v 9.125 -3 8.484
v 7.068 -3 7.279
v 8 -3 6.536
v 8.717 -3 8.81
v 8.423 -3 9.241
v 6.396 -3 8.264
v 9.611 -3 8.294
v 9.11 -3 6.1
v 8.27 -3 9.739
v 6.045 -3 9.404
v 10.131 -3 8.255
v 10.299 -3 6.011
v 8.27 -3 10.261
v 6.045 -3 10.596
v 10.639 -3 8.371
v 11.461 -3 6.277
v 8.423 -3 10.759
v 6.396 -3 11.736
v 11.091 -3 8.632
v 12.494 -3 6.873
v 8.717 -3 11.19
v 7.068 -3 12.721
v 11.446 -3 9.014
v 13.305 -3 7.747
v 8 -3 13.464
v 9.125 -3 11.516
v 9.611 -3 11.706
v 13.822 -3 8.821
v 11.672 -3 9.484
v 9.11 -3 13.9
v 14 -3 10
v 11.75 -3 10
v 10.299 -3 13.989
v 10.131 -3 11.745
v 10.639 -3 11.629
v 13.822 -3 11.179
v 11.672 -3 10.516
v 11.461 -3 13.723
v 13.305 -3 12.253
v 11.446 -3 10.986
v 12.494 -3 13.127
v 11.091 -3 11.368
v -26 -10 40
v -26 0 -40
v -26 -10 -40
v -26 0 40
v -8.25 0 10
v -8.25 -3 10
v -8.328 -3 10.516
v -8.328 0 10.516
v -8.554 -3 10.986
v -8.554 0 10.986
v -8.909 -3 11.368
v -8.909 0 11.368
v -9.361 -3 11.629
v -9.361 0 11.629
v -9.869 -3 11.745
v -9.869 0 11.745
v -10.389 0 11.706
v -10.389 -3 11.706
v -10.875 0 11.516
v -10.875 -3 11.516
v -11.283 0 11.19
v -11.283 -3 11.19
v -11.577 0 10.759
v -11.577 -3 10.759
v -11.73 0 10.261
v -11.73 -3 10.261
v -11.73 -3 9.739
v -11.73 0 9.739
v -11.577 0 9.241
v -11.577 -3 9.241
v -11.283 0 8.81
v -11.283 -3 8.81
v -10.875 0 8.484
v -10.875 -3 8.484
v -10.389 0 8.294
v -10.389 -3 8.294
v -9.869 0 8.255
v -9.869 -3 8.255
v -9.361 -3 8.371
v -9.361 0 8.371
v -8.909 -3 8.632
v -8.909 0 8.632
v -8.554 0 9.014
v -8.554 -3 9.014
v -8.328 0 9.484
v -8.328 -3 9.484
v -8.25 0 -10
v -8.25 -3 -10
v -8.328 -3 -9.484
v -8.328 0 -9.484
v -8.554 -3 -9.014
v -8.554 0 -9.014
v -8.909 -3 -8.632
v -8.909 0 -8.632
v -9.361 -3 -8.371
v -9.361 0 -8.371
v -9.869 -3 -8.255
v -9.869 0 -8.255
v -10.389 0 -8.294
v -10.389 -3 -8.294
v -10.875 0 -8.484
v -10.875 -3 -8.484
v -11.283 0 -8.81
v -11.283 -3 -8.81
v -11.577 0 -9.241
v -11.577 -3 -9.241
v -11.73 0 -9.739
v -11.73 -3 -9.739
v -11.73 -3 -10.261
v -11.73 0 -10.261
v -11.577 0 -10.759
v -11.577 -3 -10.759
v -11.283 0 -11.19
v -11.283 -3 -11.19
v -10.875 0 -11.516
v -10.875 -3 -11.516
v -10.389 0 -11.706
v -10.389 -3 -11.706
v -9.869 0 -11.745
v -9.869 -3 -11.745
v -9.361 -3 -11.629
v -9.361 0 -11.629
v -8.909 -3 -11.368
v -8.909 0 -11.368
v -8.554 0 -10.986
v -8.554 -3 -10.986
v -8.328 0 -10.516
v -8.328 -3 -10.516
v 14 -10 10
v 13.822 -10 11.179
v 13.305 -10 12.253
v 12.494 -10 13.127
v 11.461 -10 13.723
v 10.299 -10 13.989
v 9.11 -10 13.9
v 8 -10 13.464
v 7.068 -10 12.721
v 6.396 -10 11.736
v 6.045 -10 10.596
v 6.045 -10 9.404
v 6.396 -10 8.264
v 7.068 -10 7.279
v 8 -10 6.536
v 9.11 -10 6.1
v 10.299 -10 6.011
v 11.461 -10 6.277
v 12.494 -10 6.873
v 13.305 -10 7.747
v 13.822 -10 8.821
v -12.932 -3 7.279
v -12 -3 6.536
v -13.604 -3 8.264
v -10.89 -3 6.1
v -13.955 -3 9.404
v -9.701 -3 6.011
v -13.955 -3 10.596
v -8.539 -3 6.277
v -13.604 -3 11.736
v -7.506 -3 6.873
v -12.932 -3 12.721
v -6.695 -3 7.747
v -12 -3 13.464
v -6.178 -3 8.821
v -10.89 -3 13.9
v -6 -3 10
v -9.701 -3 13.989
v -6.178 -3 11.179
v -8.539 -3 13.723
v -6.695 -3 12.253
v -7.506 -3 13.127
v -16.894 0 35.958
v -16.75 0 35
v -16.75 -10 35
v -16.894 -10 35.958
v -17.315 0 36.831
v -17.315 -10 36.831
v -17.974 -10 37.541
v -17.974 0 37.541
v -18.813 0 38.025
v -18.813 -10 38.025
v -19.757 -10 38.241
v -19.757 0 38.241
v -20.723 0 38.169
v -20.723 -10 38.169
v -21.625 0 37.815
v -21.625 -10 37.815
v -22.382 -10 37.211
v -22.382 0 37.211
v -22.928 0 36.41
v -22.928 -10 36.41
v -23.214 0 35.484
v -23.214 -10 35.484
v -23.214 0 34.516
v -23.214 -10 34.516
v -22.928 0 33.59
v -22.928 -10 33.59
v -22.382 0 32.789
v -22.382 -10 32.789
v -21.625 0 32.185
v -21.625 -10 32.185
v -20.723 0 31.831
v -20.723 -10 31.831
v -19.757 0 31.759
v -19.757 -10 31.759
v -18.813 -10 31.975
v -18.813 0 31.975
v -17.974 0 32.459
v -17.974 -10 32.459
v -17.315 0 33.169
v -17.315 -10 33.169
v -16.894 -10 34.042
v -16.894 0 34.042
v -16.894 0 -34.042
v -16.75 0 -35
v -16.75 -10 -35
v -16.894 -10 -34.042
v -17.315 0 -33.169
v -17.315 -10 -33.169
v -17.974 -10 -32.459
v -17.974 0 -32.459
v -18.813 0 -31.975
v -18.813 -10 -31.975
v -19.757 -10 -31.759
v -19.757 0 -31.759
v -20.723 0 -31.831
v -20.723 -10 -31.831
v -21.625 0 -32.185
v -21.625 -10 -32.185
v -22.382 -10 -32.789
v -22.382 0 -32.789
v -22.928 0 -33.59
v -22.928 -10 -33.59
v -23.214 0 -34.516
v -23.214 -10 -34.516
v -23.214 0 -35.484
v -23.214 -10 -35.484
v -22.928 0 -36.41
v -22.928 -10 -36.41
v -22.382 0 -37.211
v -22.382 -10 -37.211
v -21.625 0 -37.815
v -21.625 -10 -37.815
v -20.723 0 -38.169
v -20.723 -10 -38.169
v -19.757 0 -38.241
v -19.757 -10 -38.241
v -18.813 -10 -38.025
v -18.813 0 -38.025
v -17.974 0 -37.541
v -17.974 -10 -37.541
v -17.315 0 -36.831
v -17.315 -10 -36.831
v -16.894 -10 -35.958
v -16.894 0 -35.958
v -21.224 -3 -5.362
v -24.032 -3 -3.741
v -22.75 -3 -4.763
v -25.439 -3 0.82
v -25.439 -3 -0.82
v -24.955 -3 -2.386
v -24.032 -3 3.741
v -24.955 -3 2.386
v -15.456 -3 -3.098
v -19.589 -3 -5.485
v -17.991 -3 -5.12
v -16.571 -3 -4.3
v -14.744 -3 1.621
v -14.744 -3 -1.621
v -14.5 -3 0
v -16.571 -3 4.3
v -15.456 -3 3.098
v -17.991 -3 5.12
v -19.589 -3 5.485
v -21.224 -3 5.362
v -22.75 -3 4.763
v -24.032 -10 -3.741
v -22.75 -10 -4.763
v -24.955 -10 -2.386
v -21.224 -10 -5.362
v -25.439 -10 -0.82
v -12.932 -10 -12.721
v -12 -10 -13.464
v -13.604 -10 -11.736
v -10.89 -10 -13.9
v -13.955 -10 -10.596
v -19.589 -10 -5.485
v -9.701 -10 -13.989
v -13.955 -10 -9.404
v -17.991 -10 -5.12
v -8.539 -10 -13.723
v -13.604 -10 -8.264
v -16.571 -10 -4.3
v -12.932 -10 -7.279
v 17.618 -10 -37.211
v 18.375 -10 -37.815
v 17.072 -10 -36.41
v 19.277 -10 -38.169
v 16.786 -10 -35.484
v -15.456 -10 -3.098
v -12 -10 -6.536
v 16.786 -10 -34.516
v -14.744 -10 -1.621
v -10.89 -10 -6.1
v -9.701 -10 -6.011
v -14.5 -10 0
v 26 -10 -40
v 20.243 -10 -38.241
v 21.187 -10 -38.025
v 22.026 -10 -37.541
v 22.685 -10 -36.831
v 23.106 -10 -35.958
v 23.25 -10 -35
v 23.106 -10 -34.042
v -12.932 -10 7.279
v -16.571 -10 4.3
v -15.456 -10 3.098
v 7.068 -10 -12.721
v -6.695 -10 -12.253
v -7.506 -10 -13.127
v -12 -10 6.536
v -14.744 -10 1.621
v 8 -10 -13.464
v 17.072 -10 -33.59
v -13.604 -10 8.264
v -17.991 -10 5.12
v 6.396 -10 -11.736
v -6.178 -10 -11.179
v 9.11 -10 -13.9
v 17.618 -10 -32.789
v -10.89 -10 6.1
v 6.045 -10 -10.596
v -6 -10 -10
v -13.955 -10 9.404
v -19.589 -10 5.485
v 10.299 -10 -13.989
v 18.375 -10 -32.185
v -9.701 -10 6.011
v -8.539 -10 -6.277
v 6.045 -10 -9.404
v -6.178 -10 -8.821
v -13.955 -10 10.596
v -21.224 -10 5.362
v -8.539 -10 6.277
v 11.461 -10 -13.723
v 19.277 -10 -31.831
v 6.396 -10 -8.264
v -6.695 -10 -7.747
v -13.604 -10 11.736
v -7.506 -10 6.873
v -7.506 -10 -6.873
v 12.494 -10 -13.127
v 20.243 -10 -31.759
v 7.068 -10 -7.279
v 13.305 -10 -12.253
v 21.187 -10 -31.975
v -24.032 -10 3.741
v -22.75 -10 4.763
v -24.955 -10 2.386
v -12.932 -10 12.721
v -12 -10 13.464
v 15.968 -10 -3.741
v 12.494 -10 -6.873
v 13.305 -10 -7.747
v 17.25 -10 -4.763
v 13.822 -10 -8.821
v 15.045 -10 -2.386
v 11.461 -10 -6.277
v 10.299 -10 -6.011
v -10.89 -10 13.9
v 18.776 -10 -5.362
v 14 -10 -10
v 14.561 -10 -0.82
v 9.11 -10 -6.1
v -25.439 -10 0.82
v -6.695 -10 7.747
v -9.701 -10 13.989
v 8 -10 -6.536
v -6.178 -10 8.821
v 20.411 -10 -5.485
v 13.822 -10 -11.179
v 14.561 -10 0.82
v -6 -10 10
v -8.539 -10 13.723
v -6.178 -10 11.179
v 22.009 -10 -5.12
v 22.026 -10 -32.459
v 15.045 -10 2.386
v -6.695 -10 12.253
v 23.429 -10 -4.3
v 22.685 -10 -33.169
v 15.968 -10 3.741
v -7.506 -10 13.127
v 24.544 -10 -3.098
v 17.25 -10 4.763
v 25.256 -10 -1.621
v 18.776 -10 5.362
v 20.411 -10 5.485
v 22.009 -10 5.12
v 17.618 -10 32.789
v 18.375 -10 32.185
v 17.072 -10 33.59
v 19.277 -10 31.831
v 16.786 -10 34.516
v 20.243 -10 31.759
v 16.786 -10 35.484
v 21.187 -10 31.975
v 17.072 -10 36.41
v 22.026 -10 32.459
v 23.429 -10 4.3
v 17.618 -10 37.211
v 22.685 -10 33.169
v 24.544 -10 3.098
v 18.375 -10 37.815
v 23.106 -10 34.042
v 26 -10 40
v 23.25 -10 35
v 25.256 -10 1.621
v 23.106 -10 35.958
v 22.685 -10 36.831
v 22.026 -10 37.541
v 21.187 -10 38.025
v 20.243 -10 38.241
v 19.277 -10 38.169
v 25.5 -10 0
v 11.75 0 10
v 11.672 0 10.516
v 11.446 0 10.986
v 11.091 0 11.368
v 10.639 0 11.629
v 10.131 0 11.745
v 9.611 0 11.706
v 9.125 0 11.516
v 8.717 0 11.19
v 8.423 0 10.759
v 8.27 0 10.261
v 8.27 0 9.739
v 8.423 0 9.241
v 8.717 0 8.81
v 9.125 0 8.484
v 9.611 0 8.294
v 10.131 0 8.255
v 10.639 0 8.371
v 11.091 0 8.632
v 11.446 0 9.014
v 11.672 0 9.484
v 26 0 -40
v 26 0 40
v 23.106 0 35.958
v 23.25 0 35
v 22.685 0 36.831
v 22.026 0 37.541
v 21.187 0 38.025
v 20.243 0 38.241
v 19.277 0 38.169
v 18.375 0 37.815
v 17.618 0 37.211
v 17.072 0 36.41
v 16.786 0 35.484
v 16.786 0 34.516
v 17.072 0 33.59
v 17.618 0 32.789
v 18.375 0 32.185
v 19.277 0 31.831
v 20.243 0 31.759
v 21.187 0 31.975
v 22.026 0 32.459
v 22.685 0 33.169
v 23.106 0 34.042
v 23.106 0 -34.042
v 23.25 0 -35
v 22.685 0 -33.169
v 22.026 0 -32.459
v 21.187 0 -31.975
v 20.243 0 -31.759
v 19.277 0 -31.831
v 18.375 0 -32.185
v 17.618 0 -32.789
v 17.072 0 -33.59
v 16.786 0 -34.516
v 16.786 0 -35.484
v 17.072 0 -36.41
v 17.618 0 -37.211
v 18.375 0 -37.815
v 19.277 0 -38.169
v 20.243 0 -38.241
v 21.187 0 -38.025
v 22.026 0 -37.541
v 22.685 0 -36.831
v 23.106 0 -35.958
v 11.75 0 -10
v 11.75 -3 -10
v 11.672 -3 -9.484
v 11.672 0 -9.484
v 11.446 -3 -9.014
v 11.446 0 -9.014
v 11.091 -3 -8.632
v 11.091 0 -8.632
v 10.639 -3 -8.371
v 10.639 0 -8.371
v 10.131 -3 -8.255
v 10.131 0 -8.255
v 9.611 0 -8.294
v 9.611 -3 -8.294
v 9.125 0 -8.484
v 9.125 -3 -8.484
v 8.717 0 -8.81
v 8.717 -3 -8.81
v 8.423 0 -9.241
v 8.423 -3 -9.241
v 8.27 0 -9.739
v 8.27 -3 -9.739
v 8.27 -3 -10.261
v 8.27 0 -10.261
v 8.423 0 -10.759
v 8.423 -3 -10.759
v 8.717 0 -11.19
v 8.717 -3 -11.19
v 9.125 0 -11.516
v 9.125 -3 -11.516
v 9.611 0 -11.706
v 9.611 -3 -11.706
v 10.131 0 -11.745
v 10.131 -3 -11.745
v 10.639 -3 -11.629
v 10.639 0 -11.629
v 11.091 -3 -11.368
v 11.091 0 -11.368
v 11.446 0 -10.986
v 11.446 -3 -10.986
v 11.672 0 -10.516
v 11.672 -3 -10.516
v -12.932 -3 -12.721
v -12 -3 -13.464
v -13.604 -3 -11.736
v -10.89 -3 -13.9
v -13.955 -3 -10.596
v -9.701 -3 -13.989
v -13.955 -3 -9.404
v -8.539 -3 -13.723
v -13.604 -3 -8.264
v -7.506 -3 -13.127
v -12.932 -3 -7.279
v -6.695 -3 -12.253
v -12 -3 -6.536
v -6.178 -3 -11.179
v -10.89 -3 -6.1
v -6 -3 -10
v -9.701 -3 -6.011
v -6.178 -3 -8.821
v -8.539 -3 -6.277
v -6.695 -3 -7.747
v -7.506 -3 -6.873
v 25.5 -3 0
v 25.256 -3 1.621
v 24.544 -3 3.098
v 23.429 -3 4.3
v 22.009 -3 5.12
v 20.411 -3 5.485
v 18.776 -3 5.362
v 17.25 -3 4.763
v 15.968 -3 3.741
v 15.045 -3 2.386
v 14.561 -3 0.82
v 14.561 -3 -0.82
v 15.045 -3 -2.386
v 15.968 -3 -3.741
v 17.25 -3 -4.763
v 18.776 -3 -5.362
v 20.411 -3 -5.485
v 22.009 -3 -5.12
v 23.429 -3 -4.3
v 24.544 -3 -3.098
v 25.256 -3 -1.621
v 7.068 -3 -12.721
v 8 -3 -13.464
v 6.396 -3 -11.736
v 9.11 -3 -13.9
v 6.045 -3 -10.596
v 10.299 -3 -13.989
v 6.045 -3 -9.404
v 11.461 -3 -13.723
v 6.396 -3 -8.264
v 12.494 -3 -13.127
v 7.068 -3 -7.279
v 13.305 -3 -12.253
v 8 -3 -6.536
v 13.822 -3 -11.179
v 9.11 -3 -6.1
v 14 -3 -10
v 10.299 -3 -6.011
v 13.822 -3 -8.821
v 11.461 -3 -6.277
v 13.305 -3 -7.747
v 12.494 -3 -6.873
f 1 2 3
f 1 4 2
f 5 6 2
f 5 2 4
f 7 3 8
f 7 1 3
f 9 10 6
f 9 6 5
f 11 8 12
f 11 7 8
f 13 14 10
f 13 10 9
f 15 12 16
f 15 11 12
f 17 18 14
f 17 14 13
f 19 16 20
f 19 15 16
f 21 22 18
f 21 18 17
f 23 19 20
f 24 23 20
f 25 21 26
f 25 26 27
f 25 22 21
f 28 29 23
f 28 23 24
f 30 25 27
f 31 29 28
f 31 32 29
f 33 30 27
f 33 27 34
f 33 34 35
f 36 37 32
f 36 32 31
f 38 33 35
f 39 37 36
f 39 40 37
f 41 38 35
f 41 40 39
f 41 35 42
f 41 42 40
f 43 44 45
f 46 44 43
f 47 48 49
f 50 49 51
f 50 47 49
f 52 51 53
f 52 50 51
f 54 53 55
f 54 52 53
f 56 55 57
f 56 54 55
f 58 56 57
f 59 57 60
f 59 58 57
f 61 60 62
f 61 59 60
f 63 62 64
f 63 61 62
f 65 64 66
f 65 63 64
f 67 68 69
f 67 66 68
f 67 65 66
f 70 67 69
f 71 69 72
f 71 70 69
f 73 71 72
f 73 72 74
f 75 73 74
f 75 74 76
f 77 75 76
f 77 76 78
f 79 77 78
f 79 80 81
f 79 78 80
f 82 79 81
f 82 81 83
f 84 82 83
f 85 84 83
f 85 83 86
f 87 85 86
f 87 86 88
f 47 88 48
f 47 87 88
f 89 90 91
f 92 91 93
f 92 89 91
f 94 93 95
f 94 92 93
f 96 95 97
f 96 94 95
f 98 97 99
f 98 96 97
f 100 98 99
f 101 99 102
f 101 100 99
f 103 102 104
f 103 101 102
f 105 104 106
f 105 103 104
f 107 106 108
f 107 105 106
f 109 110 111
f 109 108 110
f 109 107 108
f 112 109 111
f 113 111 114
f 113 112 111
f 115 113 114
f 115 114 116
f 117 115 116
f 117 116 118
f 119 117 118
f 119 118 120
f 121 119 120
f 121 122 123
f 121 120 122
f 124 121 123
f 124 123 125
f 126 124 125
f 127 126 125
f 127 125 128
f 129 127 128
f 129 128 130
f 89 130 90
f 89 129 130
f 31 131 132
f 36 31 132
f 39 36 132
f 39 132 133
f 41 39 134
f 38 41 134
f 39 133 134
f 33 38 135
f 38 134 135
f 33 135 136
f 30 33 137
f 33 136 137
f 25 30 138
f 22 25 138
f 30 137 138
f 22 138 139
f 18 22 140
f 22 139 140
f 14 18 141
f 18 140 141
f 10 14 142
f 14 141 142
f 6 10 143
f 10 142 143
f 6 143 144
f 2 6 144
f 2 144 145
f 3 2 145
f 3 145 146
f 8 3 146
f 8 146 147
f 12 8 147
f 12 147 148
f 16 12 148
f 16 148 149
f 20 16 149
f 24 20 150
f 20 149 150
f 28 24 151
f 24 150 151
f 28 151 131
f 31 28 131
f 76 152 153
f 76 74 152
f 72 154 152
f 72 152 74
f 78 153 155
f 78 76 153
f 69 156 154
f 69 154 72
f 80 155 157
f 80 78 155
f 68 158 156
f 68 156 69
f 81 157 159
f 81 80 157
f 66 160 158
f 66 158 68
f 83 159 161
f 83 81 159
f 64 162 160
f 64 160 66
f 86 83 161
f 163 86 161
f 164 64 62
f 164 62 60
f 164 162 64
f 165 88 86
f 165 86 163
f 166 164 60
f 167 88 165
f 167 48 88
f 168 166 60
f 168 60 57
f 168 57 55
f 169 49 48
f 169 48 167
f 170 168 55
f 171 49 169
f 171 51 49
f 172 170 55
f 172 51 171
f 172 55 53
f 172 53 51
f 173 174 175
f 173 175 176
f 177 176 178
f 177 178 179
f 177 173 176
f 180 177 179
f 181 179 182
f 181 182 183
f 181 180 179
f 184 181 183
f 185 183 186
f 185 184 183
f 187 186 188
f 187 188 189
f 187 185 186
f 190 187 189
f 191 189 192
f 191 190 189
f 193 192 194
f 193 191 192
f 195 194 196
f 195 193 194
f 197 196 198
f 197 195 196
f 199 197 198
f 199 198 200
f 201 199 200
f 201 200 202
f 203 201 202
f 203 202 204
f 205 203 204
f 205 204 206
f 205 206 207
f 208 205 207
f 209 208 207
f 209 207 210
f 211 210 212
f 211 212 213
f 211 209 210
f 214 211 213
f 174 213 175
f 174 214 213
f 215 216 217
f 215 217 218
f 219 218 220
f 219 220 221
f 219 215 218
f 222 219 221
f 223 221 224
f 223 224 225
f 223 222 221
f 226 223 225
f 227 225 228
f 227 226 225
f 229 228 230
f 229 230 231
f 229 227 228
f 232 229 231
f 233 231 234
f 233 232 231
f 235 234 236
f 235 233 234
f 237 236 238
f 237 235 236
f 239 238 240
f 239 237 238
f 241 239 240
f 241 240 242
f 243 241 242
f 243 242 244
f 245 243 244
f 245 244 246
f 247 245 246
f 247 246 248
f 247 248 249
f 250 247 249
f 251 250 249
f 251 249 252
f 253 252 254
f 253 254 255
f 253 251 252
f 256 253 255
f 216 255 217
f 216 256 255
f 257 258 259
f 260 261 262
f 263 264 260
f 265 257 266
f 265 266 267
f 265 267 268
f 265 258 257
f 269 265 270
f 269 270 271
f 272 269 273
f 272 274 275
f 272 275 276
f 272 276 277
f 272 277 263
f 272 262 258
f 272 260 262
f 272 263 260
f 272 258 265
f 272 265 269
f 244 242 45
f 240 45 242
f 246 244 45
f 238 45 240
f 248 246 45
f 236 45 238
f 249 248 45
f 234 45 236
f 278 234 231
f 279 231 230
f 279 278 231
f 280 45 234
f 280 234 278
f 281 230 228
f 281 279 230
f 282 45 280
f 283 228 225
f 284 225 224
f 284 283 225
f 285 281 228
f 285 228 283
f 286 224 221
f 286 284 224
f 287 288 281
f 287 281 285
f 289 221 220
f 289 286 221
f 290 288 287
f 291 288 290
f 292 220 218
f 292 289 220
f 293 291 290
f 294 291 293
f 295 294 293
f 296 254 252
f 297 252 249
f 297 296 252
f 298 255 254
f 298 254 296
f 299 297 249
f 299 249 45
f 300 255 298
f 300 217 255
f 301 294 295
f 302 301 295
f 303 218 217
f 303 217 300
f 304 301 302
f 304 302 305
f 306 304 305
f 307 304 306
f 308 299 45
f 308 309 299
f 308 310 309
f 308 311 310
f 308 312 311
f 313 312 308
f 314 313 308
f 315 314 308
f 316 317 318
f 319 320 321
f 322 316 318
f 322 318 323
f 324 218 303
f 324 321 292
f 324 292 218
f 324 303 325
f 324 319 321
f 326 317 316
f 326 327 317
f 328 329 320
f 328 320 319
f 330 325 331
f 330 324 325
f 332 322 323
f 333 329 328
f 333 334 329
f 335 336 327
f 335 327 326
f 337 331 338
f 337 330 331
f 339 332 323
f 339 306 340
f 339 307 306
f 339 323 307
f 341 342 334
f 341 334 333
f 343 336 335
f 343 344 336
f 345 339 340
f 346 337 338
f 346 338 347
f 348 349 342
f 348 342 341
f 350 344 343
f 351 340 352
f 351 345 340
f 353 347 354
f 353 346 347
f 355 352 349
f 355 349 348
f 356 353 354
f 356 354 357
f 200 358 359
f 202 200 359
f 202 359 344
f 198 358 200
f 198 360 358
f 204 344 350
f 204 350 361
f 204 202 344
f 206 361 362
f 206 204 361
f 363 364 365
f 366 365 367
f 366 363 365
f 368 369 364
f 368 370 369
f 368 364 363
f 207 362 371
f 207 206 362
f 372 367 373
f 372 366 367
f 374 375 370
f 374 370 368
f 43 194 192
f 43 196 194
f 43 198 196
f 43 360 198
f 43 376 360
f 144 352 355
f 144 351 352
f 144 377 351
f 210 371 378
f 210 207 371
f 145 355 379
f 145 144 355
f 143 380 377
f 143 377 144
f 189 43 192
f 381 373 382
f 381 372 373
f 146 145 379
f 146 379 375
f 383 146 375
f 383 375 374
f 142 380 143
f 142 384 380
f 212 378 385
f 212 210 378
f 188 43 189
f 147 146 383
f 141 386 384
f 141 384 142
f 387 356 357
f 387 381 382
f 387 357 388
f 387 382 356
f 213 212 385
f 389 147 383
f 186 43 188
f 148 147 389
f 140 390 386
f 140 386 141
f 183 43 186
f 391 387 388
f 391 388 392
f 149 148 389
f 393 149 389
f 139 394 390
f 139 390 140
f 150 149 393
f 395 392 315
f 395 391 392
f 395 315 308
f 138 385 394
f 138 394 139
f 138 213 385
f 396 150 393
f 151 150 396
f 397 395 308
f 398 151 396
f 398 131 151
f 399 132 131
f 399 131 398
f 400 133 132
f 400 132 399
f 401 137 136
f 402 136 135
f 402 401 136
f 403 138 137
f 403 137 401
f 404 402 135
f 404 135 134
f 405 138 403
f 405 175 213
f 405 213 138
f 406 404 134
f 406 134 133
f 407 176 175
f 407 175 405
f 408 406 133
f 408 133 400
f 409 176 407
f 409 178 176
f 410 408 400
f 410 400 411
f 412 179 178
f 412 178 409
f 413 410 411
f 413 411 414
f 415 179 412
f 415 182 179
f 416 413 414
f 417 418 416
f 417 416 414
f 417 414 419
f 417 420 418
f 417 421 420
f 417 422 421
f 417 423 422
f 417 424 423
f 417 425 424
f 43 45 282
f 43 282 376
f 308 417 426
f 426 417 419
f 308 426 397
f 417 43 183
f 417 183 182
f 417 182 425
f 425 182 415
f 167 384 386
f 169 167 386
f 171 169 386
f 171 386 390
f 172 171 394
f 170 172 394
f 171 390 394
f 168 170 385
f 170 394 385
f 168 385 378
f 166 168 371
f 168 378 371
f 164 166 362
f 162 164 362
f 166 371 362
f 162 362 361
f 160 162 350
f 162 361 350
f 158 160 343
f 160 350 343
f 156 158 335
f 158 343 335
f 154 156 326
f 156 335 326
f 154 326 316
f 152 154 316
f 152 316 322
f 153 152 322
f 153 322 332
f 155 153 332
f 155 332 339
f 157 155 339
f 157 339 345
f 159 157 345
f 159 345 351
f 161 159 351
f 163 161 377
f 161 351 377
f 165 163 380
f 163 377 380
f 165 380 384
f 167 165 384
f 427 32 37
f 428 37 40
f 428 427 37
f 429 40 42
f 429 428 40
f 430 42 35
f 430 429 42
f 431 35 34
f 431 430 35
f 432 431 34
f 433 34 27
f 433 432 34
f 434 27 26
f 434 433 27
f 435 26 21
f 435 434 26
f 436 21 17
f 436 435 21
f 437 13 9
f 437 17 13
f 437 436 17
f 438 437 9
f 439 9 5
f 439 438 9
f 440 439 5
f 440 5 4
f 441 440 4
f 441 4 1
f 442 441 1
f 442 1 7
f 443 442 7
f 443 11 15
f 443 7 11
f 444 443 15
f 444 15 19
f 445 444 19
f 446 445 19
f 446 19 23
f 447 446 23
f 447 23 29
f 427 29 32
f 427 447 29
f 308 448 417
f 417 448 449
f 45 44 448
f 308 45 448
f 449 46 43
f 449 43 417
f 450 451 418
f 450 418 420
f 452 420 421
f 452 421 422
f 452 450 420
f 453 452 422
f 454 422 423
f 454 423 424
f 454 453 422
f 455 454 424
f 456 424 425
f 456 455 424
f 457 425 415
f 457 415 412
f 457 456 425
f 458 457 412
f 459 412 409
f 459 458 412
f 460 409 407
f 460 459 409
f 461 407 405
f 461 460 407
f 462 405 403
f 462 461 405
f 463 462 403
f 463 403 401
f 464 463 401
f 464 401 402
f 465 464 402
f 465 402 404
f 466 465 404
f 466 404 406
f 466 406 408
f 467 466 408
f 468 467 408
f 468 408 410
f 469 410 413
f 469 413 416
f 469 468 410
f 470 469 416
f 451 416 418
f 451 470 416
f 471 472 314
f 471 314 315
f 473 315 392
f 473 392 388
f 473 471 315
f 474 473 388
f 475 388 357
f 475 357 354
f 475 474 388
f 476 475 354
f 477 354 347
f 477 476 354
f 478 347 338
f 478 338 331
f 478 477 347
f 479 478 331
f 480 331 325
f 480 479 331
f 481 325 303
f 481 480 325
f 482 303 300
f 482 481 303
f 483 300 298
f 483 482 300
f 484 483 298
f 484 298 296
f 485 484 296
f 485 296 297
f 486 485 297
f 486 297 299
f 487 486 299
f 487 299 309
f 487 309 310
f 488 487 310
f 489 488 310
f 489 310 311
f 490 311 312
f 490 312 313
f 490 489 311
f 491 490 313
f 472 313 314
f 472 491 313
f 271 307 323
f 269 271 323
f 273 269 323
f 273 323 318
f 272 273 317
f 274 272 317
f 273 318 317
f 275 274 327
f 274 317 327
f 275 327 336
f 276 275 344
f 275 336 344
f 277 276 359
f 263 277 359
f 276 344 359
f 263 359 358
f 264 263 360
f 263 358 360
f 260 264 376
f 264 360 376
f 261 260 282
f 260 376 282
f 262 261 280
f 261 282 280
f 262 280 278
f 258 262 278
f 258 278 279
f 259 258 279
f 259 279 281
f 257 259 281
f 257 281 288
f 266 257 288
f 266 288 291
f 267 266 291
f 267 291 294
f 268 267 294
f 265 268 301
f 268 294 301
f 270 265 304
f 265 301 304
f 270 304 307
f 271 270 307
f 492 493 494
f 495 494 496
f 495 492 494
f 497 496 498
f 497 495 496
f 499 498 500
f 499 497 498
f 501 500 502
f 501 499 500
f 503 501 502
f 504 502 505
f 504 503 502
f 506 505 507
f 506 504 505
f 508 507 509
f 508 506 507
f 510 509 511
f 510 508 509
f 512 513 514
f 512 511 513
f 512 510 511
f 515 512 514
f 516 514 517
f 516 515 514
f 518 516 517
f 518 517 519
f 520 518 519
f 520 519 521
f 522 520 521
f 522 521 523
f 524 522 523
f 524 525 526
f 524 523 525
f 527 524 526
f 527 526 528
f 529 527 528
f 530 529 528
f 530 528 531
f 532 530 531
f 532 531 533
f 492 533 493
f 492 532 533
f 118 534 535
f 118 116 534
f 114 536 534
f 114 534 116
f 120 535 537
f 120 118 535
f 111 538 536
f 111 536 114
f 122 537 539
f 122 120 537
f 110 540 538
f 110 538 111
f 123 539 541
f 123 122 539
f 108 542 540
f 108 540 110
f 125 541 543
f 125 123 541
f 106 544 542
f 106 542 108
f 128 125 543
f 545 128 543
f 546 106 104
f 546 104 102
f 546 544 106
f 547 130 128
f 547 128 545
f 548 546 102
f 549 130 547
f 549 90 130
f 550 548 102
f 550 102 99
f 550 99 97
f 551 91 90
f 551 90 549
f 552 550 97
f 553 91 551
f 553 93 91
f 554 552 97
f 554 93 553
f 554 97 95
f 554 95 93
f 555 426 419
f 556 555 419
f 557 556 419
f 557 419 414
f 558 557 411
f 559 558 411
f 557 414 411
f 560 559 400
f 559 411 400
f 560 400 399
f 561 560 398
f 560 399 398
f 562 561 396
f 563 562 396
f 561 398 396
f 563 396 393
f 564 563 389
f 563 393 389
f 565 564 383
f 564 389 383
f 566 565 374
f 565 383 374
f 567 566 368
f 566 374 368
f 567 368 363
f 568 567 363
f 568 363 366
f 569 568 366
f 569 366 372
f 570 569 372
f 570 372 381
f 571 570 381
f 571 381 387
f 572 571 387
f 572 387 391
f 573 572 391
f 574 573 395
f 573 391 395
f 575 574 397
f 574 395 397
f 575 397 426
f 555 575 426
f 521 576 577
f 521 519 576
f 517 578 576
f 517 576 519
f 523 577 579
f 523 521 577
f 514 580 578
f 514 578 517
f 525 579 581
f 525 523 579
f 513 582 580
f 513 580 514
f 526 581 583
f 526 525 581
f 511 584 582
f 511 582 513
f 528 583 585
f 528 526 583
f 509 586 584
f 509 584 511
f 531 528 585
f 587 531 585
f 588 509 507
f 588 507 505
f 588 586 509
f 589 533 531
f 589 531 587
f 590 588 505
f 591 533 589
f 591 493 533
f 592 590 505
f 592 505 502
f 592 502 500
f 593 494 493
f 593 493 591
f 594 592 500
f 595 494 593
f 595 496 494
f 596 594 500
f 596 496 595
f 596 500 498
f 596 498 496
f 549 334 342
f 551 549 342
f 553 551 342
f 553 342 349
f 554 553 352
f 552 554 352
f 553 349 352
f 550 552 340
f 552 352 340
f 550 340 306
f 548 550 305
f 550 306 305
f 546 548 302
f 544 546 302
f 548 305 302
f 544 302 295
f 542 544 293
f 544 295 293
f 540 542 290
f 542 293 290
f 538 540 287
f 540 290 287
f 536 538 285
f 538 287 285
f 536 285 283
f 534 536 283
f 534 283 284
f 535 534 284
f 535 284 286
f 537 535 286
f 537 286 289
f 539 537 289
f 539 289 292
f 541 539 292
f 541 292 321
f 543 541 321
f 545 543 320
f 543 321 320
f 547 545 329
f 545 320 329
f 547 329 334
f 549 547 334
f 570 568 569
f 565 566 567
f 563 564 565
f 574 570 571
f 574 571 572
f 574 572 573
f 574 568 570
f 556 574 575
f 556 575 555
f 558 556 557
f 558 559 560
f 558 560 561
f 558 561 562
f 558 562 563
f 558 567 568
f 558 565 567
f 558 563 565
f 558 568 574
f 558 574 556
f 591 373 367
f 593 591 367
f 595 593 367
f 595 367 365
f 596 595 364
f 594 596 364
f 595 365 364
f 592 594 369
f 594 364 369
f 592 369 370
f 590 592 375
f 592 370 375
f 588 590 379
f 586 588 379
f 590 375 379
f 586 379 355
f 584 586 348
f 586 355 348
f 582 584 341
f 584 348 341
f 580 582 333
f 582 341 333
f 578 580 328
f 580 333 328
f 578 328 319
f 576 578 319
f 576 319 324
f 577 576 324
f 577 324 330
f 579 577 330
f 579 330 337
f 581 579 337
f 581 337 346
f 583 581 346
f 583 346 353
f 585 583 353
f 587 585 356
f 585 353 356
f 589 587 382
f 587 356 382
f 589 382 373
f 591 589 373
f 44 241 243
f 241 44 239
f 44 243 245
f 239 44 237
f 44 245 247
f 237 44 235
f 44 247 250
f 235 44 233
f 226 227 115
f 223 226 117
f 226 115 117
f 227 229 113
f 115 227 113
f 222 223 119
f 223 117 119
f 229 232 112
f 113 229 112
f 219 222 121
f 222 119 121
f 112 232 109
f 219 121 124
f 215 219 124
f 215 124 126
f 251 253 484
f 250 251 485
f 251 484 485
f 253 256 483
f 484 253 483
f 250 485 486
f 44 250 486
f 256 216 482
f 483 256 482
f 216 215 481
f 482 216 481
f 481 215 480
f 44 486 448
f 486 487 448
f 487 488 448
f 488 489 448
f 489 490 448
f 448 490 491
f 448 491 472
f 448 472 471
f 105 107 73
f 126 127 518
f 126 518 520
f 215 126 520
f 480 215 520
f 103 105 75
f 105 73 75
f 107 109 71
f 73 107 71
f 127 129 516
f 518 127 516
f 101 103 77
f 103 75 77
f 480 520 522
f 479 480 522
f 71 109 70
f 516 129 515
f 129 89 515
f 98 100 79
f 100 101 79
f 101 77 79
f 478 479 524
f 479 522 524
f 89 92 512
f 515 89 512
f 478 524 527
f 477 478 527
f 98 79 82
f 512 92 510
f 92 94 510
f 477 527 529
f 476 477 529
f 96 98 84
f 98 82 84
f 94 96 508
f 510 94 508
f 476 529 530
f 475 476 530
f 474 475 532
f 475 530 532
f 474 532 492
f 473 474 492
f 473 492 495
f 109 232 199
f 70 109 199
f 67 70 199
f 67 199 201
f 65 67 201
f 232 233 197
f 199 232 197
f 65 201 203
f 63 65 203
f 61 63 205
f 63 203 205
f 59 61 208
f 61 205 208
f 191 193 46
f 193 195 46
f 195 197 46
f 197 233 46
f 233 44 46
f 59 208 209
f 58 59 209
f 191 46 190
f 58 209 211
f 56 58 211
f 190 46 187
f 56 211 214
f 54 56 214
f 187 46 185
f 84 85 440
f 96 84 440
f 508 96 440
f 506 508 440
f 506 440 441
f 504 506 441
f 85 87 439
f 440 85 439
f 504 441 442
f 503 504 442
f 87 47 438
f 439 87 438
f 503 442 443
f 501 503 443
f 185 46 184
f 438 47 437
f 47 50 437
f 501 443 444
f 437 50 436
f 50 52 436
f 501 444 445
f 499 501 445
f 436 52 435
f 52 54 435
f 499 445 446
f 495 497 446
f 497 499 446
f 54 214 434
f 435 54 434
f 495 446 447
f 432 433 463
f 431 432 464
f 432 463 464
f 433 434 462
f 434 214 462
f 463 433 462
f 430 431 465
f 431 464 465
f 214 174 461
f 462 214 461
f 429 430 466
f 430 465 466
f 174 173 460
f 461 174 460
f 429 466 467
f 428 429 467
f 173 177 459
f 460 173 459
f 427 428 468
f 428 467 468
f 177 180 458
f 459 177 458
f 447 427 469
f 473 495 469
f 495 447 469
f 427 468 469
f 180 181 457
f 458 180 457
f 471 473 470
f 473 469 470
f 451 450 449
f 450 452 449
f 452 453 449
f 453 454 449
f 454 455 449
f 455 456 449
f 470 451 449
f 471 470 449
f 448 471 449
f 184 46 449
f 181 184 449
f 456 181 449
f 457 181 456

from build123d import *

# Parameters (mm, degrees)
F0_W     = 52
F0_H     = 80
F0_R     = 3.25
F0_R_2   = 1.75
F1_DEPTH = 10
F2_R     = 5.5
F3_DEPTH = 7
F4_R     = 4
F5_DEPTH = 7


with BuildPart() as f1:
    # F0 (on Front) → F1 (new body)
    with BuildSketch(Plane.XZ):
        Rectangle(F0_W, F0_H)
        with Locations((-20, -35)):
            Circle(F0_R, mode=Mode.SUBTRACT)
        with Locations((-10, -10)):
            Circle(F0_R_2, mode=Mode.SUBTRACT)
        with Locations((20, -35)):
            Circle(F0_R, mode=Mode.SUBTRACT)
        with Locations((10, -10)):
            Circle(F0_R_2, mode=Mode.SUBTRACT)
        with Locations((-10, 10)):
            Circle(F0_R_2, mode=Mode.SUBTRACT)
        with Locations((-20, 35)):
            Circle(F0_R, mode=Mode.SUBTRACT)
        with Locations((10, 10)):
            Circle(F0_R_2, mode=Mode.SUBTRACT)
        with Locations((20, 35)):
            Circle(F0_R, mode=Mode.SUBTRACT)
    extrude(amount=F1_DEPTH)

    # F2 (on face) → F3 (cut)
    with BuildSketch(Plane.XZ.offset(10)):
        with Locations((-20, 0)):
            Circle(F2_R)
        with Locations((20, 0)):
            Circle(F2_R)
    extrude(amount=-F3_DEPTH, mode=Mode.SUBTRACT)

    # F4 (on face) → F5 (cut)
    with BuildSketch(Plane.XZ.offset(10)):
        with Locations((-10, 10)):
            Circle(F4_R)
        with Locations((10, 10)):
            Circle(F4_R)
        with Locations((-10, -10)):
            Circle(F4_R)
        with Locations((10, -10)):
            Circle(F4_R)
    extrude(amount=-F5_DEPTH, mode=Mode.SUBTRACT)


solid = f1.part
